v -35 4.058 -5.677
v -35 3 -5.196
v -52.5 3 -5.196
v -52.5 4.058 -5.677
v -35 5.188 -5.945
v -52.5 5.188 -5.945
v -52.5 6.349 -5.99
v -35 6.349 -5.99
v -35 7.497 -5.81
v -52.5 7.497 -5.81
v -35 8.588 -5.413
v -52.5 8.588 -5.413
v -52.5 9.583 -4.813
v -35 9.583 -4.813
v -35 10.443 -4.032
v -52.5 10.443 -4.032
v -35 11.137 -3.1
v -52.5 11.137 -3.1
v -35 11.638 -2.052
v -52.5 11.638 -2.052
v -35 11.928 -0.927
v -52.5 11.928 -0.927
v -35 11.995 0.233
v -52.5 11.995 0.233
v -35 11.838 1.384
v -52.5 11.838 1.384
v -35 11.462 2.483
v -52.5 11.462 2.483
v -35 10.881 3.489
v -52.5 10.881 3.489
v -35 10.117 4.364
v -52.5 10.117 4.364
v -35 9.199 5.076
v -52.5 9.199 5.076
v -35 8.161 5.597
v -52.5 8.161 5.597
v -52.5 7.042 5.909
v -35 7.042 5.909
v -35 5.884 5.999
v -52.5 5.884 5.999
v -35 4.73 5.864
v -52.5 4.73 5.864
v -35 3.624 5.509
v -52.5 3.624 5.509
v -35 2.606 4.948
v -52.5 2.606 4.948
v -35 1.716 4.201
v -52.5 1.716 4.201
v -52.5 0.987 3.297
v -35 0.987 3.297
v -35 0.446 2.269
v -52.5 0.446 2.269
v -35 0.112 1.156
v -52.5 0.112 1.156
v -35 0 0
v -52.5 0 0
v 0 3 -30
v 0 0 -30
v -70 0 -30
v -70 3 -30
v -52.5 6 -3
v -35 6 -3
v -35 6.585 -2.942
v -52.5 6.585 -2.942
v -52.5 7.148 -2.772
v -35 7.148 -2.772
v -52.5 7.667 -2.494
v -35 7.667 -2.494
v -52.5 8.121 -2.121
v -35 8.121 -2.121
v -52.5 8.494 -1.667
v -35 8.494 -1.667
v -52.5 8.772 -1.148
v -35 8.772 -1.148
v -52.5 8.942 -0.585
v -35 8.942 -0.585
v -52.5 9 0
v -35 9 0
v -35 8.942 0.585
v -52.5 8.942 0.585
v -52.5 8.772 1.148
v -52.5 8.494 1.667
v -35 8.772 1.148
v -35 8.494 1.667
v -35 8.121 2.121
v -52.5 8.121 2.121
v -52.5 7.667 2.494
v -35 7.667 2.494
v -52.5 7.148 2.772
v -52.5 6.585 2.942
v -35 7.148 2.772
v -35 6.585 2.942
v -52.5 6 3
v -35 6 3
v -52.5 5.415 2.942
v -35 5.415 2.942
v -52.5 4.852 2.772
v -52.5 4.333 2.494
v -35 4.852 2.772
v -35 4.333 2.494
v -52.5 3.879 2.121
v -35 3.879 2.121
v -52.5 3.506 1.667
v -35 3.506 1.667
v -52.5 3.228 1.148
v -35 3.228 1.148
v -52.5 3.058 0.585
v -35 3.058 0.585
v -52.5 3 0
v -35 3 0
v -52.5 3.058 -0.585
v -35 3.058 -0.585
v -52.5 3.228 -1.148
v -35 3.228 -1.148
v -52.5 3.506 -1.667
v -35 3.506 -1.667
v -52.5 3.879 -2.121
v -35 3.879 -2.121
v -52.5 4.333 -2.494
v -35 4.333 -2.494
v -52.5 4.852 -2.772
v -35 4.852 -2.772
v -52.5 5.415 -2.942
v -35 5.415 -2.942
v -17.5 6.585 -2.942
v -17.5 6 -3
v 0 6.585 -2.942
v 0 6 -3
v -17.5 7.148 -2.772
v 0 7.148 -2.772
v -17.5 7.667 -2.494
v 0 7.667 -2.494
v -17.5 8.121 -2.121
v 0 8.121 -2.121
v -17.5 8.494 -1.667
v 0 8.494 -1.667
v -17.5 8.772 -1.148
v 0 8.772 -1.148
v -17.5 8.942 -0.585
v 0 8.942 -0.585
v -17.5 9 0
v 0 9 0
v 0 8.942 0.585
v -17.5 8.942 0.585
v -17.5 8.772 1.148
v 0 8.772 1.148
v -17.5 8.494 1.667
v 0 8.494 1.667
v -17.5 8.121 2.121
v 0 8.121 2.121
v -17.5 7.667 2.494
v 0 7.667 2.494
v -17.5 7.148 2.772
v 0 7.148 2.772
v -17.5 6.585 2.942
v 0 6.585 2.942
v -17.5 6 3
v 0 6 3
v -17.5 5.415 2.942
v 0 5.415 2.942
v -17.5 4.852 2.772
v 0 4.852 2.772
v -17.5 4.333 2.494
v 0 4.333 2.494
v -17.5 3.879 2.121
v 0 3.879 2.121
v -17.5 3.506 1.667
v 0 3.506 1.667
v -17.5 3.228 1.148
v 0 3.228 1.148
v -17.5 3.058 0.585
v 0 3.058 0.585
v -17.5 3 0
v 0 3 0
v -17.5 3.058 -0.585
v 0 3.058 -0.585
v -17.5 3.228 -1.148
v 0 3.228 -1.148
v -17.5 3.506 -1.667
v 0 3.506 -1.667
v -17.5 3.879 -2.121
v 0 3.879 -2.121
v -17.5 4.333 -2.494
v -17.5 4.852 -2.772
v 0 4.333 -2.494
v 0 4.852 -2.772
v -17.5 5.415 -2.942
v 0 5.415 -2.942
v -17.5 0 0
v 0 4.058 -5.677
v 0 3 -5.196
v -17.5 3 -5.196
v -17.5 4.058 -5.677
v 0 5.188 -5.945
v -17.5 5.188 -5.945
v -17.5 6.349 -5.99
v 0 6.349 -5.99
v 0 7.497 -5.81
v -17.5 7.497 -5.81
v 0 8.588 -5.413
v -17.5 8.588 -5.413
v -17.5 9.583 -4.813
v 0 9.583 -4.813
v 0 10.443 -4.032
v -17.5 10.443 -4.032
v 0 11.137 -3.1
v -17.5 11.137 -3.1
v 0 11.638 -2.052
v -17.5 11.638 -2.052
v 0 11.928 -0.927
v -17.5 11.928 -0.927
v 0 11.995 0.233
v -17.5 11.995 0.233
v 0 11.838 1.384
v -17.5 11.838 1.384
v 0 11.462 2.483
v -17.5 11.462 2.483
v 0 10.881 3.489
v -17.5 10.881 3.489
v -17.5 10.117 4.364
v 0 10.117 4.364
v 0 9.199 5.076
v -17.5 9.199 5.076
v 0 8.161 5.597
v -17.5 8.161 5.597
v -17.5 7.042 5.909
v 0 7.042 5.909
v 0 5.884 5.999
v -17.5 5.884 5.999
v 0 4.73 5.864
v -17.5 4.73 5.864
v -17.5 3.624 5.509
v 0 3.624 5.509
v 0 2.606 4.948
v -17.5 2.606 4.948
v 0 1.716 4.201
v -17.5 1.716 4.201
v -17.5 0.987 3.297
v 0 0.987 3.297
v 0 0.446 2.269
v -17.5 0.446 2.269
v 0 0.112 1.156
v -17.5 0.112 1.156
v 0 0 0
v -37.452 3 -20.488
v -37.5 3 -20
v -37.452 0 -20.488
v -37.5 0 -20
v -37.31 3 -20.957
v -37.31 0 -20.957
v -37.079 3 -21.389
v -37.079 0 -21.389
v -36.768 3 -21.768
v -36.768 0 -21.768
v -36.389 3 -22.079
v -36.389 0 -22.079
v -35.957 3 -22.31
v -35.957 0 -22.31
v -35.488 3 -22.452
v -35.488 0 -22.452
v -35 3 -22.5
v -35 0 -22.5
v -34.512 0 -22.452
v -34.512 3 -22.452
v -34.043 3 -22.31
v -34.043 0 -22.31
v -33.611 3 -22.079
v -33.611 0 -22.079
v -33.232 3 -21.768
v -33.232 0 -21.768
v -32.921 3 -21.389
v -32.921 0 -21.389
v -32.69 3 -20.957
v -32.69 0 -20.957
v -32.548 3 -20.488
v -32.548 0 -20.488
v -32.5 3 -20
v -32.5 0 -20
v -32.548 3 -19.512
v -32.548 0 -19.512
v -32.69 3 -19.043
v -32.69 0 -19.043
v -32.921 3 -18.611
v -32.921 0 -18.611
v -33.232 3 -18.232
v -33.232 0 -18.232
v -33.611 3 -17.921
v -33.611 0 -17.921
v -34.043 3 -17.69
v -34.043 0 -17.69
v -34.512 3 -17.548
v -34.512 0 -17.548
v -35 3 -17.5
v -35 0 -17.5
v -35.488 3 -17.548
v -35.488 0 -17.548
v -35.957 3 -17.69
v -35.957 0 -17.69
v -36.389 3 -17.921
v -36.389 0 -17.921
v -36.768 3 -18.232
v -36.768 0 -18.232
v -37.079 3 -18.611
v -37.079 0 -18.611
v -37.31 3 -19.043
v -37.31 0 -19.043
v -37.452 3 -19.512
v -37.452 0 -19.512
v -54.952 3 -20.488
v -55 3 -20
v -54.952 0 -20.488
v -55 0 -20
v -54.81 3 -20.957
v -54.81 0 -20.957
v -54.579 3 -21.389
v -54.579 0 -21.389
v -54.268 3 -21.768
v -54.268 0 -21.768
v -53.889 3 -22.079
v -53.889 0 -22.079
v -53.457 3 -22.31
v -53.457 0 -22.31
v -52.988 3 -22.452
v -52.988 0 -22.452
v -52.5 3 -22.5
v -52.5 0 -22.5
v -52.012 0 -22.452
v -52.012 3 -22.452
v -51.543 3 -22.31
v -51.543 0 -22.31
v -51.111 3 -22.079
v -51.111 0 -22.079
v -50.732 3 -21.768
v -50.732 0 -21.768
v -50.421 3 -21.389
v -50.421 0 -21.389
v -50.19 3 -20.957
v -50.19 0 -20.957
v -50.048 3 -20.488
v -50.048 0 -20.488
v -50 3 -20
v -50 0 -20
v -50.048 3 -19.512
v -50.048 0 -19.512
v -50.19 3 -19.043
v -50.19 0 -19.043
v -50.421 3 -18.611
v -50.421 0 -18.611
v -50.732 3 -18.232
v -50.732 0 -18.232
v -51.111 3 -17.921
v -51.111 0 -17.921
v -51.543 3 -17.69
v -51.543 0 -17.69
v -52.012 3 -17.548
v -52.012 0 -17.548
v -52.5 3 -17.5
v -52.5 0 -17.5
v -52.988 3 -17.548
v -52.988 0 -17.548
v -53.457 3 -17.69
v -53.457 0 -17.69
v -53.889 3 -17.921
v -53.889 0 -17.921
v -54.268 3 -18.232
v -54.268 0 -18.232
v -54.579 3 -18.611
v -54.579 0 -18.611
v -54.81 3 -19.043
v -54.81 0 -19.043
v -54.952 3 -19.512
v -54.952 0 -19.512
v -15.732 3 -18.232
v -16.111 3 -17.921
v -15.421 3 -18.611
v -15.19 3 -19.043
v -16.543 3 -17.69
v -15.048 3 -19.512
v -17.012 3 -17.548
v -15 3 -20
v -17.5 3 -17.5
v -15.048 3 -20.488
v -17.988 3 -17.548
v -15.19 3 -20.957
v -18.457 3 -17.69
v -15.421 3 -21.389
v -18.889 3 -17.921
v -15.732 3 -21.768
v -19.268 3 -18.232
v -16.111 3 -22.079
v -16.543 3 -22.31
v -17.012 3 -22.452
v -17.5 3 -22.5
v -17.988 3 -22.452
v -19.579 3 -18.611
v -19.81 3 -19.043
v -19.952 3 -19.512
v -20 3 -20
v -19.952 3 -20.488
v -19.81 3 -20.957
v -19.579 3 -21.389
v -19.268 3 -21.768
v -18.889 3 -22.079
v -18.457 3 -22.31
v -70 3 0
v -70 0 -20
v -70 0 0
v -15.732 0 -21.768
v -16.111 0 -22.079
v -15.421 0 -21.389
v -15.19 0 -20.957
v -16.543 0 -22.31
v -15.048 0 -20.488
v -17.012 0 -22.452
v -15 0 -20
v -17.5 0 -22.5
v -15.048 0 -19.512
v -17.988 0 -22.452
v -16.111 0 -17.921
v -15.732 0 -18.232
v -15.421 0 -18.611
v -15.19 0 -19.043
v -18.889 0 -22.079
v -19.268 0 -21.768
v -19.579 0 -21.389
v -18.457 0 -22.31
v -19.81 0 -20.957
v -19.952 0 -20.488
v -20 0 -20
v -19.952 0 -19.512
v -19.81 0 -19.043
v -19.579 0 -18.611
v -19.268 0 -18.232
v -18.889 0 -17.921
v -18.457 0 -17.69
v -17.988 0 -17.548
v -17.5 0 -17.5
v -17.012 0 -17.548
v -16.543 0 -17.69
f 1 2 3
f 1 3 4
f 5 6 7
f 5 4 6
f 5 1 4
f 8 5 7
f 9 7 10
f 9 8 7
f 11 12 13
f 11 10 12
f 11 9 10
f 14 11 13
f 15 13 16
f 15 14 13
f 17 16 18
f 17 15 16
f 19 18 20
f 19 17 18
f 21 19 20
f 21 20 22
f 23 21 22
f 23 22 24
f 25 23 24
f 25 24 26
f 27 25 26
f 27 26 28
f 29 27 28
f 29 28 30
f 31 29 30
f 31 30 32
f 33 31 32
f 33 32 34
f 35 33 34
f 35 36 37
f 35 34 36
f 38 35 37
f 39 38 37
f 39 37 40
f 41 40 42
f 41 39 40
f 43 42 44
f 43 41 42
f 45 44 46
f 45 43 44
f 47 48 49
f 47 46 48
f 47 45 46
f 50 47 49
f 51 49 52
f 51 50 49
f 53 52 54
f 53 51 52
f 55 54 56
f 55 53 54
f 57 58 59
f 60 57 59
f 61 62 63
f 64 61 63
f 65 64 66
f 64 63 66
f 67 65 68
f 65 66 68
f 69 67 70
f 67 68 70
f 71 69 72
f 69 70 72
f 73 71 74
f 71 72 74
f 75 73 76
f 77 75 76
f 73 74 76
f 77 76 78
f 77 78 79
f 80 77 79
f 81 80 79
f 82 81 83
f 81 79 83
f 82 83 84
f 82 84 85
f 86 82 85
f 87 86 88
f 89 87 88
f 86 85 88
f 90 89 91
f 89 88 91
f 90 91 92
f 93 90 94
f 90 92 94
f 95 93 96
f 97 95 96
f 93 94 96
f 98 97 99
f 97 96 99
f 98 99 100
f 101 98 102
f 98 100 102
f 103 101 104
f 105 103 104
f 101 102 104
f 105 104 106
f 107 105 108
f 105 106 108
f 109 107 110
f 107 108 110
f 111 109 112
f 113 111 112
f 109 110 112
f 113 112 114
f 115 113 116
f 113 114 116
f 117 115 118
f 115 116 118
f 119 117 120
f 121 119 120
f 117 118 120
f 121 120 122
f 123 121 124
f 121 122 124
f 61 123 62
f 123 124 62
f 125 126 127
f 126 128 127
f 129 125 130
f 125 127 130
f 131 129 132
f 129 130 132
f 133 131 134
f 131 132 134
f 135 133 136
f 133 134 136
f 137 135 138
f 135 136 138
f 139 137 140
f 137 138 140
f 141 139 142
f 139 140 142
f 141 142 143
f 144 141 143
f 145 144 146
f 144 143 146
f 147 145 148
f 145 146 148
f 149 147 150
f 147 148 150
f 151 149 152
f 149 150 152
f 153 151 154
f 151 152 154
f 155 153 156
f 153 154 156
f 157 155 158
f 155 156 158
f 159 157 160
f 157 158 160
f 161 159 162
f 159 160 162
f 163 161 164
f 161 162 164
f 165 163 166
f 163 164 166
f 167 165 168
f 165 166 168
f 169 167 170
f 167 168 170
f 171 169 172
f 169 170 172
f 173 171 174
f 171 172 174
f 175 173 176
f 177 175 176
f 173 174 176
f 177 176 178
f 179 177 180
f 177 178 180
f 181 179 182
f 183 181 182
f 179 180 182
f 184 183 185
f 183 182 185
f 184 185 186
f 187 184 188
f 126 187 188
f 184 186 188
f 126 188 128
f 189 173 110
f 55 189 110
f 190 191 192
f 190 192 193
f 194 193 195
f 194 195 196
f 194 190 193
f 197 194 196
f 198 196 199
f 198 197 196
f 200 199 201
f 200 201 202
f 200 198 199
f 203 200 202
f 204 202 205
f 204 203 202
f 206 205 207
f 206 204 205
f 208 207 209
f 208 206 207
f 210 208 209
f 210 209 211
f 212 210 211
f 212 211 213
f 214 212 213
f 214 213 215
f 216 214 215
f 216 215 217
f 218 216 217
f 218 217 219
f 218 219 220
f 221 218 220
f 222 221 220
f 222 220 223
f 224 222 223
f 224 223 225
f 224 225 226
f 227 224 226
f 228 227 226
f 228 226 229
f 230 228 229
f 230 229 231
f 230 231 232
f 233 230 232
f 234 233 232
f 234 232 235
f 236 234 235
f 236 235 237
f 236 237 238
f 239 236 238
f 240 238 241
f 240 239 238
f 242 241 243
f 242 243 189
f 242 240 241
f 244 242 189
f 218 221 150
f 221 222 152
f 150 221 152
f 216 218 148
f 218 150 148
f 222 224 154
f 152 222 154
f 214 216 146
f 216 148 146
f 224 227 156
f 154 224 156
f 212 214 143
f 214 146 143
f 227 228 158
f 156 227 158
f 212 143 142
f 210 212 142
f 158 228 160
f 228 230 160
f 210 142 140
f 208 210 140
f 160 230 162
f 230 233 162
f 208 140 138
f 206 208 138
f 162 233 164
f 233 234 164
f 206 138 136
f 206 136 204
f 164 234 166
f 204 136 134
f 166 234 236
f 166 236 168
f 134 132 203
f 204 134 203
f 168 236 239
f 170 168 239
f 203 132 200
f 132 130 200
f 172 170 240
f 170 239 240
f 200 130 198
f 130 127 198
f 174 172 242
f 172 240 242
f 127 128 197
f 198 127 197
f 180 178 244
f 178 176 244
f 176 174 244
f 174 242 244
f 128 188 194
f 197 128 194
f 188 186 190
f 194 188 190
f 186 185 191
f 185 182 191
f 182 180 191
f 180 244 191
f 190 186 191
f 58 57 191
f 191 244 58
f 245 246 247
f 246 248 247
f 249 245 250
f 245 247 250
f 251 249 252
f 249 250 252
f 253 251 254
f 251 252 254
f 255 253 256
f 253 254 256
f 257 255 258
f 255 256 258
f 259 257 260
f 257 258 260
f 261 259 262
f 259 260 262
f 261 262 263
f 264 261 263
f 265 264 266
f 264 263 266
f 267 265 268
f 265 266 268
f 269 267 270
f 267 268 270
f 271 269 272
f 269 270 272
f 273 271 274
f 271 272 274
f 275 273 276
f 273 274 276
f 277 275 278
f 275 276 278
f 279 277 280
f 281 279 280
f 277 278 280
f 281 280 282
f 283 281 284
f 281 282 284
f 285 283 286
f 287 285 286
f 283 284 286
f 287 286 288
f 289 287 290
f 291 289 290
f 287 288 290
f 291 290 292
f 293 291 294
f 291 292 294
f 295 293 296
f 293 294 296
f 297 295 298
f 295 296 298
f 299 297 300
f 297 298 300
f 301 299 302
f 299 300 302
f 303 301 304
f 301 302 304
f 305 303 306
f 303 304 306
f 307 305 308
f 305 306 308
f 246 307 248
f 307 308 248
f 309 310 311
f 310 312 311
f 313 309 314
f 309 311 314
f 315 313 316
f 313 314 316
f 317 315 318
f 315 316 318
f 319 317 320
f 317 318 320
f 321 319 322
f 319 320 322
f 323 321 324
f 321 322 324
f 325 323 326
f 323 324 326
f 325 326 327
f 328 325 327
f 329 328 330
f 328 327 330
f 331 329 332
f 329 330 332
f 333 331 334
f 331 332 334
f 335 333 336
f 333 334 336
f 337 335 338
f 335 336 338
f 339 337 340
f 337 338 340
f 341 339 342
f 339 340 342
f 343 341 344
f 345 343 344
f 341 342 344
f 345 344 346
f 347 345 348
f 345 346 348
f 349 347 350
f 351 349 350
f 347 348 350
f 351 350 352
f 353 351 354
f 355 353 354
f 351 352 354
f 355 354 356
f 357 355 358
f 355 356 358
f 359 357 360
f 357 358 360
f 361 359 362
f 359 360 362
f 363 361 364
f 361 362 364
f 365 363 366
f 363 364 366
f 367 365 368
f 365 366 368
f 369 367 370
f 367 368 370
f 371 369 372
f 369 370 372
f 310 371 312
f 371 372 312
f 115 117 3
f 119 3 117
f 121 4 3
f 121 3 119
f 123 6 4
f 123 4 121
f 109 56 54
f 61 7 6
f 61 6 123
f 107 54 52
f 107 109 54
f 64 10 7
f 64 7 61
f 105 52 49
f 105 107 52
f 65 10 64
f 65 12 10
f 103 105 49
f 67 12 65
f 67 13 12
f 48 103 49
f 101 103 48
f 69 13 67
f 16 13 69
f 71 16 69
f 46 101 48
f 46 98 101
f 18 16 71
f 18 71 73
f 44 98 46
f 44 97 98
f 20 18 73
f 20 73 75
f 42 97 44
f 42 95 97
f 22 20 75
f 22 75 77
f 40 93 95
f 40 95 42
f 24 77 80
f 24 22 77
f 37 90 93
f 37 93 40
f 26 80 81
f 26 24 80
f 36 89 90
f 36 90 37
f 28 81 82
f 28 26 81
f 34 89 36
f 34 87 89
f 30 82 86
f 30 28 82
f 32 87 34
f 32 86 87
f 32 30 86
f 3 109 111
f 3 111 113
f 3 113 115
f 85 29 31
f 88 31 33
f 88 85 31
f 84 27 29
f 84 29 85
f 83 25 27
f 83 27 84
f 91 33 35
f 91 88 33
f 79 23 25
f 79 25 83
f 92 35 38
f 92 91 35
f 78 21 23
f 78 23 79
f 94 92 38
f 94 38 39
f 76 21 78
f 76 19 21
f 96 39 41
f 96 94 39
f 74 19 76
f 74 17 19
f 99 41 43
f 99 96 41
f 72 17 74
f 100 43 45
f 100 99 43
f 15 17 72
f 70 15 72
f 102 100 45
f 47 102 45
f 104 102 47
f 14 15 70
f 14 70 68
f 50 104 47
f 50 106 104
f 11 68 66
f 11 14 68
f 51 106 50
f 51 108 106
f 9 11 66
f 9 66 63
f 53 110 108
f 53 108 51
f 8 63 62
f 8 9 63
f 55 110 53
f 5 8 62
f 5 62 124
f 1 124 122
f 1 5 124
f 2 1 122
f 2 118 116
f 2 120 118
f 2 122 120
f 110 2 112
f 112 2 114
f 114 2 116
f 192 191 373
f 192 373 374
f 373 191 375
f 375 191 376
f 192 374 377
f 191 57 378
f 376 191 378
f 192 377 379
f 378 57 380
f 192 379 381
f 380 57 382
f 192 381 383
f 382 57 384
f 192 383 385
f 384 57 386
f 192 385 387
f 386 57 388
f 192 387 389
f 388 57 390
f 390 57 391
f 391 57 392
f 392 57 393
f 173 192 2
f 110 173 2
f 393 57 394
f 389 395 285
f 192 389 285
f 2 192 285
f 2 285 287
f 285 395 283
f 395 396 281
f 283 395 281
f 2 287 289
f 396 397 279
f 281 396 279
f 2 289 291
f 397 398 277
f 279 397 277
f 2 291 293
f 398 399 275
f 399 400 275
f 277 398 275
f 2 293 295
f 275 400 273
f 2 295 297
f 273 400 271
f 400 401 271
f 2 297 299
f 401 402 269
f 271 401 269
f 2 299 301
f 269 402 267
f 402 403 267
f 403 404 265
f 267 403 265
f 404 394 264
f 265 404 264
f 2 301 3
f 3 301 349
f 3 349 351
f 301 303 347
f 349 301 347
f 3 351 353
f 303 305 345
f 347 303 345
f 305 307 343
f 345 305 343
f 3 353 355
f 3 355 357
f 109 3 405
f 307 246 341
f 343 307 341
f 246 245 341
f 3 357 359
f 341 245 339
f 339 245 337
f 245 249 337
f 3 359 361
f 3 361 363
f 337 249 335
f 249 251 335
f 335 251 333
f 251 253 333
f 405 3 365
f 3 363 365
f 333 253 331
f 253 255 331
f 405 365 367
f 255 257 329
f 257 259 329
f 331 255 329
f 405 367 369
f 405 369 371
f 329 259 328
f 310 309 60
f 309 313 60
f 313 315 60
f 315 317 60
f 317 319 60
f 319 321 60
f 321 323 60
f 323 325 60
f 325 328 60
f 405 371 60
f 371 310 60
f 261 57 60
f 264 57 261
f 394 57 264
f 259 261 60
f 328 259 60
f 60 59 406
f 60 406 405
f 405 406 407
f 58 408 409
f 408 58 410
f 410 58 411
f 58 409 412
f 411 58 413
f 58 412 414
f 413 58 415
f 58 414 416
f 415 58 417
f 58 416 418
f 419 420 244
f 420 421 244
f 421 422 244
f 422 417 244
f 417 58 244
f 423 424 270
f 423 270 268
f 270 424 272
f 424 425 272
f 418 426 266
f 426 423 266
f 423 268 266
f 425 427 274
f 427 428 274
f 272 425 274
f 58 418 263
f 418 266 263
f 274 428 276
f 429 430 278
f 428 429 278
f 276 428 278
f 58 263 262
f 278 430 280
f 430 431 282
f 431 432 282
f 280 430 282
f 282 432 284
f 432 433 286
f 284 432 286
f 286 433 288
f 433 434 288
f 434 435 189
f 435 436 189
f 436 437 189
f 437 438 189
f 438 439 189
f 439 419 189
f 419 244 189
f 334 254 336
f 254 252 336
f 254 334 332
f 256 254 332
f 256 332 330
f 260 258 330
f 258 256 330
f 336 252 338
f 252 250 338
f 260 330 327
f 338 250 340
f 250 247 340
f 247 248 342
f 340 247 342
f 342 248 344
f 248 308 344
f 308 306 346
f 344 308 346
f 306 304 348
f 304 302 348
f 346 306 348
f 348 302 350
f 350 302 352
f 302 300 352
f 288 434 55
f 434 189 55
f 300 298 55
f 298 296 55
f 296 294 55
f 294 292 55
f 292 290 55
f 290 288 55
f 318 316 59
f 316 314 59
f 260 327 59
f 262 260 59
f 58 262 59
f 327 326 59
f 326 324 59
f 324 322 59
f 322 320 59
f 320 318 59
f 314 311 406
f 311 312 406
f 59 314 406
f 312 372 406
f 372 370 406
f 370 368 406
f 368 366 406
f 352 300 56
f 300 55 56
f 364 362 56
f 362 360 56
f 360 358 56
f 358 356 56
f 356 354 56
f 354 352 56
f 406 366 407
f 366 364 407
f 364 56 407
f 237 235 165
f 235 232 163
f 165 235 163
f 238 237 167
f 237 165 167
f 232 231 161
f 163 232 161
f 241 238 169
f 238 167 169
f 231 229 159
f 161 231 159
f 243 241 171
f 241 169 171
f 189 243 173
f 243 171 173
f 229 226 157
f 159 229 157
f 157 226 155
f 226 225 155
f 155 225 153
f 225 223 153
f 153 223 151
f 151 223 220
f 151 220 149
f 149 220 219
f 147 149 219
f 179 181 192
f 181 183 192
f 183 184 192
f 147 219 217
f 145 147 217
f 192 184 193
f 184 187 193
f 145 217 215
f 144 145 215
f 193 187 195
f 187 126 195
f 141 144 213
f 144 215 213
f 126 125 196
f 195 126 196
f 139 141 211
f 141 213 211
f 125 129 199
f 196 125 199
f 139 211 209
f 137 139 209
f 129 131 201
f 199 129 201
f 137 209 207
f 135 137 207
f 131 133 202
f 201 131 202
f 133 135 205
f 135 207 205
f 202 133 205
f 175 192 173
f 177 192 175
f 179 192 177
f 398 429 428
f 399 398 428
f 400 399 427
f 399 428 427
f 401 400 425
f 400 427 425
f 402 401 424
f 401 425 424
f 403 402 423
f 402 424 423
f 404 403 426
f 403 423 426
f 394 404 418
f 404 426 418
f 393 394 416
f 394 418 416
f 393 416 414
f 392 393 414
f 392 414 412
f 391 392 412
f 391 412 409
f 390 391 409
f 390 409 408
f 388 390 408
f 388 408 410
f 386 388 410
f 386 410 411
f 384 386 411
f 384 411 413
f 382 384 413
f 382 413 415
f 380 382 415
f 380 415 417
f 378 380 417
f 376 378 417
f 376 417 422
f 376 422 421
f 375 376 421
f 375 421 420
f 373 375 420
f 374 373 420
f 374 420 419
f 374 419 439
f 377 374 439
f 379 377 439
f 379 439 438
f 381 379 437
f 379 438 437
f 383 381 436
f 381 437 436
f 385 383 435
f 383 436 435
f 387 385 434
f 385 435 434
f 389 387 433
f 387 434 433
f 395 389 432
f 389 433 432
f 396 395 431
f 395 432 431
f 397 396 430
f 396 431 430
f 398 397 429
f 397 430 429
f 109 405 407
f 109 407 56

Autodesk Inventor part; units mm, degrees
ref_plane "YZ Plane" through (0, 0, 0) normal (1, 0, 0) x (0, 1, 0)
ref_plane "XZ Plane" through (0, 0, 0) normal (0, 1, 0) x (-1, 0, 0)
ref_plane "XY Plane" through (0, 0, 0) normal (0, 0, 1) x (1, 0, 0)
sketch "Sketch1" plane through (0, 0, 0) normal (0, 1, 0) x (-1, 0, 0)
  line L0 (0, 0) -> (0, -30)
  line L1 (0, -30) -> (70, -30)
  line L2 (70, -30) -> (70, 0)
  line L3 (70, 0) -> (0, 0)
  line L4 (70, -30) -> (70, -20)
  line L5 (70, -20) -> (52.5, -20)
  line L6 (52.5, -20) -> (35, -20)
  line L7 (35, -20) -> (17.5, -20)
  circle A0 centre (52.5, -20) radius 2.5
  circle A1 centre (35, -20) radius 2.5
  circle A2 centre (17.5, -20) radius 2.5
  dimension "d0" = 30
  dimension "d1" = 70
  dimension "d2" = 10
  dimension "d3" = 17.5
  dimension "d4" = 17.5
  dimension "d5" = 17.5
  dimension "d6" = 5
  dimension "d7" = 5
  dimension "d8" = 5
extrude "Extrusion1" add sketch "Sketch1" along normal blind 3
sketch "Sketch2" plane through (0, 0, 0) normal (1, 0, 0) x (0, 0, -1)
  line L0 (0, 3) -> (30, 3) projected
  circle A0 centre (0, 6) radius 3
  line L1 (0, 0) -> (0, 3) projected
  circle A1 centre (0, 6) radius 6
extrude "Extrusion2" add sketch "Sketch2" against normal blind 70 contours L1 A1 L0 | A0 | L0 A1 L1
sketch "Sketch3" plane through (0, 0, -30) normal (1, 0, 0) x (0, 0, -1)
  line L0 (-30, 0) -> (0, 0) projected
  line L1 (-30, 0) -> (-30, 6)
  circle A0 centre (-30, 6) radius 3
  dimension "d14" = 6
  dimension "d15" = 6
extrude "Extrusion3" cut sketch "Sketch3" against normal blind 70
sketch "Sketch4" plane through (0, 0, -30) normal (0, 0, -1) x (-1, 0, 0)
  line L0 (0, 0) -> (70, 0) projected
  line L1 (0, 0) -> (0, 3)
  line L2 (0, 3) -> (70, 3) projected
  line L3 (0, 3) -> (17.5, 3)
  line L4 (17.5, 3) -> (35, 3)
  line L5 (35, 3) -> (52.5, 3)
  line L6 (52.5, 3) -> (70, 3)
  line L7 (70, 0) -> (70, 12) projected
  line L8 (70, 3) -> (70, 12)
  line L9 (70, 12) -> (52.5, 12)
  line L10 (0, 12) -> (70, 12) projected
  line L11 (52.5, 3) -> (52.5, 12)
  line L12 (17.5, 3) -> (17.5, 12)
  line L13 (17.5, 12) -> (35, 12)
  line L14 (35, 12) -> (35, 3)
  dimension "d18" = 17.5
  dimension "d19" = 17.5
  dimension "d20" = 17.5
extrude "Extrusion4" cut sketch "Sketch4" against normal blind 70 contours L2 L11 L9 L7 | L12 L10 L14 L2
sketch "Sketch5" plane through (0, 3, 0) normal (0, 1, 0) x (1, 0, 0)
  line L0 (-17.5, -5.1962) -> (-35, -5.1962) projected
  line L1 (-35, 6) -> (-35, -6) projected
  line L2 (-35, 0) -> (-35, -5.1962) projected
  line L3 (-35, -5.1962) -> (-17.5, -5.1962)
  line L4 (-17.5, -5.1962) -> (-17.5, 0)
  line L5 (-17.5, 0) -> (-35, 0)
  line L6 (-35, 5.1962) -> (-35, 0) projected
  line L7 (-35, 0) -> (-35, -5.1962)
  line L8 (-52.5, -5.1962) -> (-70, -5.1962) projected
  line L9 (-52.5, -5.1962) -> (-70, -5.1962)
  line L10 (-70, 0) -> (-70, -5.1962) projected
  line L11 (-70, -5.1962) -> (-70, 0)
  line L12 (-70, 0) -> (-52.5, 0)
  line L13 (-70, 0) -> (0, 0) projected
  line L14 (-52.5, 0) -> (-52.5, -5.1962) projected
  line L15 (-52.5, 5.1962) -> (-52.5, 0) projected
  line L16 (-52.5, -5.1962) -> (-52.5, 0)
  dimension "d24" = 17.5
extrude "Extrusion5" cut sketch "Sketch5" against normal blind 70
properties part number "Dobradiça"
